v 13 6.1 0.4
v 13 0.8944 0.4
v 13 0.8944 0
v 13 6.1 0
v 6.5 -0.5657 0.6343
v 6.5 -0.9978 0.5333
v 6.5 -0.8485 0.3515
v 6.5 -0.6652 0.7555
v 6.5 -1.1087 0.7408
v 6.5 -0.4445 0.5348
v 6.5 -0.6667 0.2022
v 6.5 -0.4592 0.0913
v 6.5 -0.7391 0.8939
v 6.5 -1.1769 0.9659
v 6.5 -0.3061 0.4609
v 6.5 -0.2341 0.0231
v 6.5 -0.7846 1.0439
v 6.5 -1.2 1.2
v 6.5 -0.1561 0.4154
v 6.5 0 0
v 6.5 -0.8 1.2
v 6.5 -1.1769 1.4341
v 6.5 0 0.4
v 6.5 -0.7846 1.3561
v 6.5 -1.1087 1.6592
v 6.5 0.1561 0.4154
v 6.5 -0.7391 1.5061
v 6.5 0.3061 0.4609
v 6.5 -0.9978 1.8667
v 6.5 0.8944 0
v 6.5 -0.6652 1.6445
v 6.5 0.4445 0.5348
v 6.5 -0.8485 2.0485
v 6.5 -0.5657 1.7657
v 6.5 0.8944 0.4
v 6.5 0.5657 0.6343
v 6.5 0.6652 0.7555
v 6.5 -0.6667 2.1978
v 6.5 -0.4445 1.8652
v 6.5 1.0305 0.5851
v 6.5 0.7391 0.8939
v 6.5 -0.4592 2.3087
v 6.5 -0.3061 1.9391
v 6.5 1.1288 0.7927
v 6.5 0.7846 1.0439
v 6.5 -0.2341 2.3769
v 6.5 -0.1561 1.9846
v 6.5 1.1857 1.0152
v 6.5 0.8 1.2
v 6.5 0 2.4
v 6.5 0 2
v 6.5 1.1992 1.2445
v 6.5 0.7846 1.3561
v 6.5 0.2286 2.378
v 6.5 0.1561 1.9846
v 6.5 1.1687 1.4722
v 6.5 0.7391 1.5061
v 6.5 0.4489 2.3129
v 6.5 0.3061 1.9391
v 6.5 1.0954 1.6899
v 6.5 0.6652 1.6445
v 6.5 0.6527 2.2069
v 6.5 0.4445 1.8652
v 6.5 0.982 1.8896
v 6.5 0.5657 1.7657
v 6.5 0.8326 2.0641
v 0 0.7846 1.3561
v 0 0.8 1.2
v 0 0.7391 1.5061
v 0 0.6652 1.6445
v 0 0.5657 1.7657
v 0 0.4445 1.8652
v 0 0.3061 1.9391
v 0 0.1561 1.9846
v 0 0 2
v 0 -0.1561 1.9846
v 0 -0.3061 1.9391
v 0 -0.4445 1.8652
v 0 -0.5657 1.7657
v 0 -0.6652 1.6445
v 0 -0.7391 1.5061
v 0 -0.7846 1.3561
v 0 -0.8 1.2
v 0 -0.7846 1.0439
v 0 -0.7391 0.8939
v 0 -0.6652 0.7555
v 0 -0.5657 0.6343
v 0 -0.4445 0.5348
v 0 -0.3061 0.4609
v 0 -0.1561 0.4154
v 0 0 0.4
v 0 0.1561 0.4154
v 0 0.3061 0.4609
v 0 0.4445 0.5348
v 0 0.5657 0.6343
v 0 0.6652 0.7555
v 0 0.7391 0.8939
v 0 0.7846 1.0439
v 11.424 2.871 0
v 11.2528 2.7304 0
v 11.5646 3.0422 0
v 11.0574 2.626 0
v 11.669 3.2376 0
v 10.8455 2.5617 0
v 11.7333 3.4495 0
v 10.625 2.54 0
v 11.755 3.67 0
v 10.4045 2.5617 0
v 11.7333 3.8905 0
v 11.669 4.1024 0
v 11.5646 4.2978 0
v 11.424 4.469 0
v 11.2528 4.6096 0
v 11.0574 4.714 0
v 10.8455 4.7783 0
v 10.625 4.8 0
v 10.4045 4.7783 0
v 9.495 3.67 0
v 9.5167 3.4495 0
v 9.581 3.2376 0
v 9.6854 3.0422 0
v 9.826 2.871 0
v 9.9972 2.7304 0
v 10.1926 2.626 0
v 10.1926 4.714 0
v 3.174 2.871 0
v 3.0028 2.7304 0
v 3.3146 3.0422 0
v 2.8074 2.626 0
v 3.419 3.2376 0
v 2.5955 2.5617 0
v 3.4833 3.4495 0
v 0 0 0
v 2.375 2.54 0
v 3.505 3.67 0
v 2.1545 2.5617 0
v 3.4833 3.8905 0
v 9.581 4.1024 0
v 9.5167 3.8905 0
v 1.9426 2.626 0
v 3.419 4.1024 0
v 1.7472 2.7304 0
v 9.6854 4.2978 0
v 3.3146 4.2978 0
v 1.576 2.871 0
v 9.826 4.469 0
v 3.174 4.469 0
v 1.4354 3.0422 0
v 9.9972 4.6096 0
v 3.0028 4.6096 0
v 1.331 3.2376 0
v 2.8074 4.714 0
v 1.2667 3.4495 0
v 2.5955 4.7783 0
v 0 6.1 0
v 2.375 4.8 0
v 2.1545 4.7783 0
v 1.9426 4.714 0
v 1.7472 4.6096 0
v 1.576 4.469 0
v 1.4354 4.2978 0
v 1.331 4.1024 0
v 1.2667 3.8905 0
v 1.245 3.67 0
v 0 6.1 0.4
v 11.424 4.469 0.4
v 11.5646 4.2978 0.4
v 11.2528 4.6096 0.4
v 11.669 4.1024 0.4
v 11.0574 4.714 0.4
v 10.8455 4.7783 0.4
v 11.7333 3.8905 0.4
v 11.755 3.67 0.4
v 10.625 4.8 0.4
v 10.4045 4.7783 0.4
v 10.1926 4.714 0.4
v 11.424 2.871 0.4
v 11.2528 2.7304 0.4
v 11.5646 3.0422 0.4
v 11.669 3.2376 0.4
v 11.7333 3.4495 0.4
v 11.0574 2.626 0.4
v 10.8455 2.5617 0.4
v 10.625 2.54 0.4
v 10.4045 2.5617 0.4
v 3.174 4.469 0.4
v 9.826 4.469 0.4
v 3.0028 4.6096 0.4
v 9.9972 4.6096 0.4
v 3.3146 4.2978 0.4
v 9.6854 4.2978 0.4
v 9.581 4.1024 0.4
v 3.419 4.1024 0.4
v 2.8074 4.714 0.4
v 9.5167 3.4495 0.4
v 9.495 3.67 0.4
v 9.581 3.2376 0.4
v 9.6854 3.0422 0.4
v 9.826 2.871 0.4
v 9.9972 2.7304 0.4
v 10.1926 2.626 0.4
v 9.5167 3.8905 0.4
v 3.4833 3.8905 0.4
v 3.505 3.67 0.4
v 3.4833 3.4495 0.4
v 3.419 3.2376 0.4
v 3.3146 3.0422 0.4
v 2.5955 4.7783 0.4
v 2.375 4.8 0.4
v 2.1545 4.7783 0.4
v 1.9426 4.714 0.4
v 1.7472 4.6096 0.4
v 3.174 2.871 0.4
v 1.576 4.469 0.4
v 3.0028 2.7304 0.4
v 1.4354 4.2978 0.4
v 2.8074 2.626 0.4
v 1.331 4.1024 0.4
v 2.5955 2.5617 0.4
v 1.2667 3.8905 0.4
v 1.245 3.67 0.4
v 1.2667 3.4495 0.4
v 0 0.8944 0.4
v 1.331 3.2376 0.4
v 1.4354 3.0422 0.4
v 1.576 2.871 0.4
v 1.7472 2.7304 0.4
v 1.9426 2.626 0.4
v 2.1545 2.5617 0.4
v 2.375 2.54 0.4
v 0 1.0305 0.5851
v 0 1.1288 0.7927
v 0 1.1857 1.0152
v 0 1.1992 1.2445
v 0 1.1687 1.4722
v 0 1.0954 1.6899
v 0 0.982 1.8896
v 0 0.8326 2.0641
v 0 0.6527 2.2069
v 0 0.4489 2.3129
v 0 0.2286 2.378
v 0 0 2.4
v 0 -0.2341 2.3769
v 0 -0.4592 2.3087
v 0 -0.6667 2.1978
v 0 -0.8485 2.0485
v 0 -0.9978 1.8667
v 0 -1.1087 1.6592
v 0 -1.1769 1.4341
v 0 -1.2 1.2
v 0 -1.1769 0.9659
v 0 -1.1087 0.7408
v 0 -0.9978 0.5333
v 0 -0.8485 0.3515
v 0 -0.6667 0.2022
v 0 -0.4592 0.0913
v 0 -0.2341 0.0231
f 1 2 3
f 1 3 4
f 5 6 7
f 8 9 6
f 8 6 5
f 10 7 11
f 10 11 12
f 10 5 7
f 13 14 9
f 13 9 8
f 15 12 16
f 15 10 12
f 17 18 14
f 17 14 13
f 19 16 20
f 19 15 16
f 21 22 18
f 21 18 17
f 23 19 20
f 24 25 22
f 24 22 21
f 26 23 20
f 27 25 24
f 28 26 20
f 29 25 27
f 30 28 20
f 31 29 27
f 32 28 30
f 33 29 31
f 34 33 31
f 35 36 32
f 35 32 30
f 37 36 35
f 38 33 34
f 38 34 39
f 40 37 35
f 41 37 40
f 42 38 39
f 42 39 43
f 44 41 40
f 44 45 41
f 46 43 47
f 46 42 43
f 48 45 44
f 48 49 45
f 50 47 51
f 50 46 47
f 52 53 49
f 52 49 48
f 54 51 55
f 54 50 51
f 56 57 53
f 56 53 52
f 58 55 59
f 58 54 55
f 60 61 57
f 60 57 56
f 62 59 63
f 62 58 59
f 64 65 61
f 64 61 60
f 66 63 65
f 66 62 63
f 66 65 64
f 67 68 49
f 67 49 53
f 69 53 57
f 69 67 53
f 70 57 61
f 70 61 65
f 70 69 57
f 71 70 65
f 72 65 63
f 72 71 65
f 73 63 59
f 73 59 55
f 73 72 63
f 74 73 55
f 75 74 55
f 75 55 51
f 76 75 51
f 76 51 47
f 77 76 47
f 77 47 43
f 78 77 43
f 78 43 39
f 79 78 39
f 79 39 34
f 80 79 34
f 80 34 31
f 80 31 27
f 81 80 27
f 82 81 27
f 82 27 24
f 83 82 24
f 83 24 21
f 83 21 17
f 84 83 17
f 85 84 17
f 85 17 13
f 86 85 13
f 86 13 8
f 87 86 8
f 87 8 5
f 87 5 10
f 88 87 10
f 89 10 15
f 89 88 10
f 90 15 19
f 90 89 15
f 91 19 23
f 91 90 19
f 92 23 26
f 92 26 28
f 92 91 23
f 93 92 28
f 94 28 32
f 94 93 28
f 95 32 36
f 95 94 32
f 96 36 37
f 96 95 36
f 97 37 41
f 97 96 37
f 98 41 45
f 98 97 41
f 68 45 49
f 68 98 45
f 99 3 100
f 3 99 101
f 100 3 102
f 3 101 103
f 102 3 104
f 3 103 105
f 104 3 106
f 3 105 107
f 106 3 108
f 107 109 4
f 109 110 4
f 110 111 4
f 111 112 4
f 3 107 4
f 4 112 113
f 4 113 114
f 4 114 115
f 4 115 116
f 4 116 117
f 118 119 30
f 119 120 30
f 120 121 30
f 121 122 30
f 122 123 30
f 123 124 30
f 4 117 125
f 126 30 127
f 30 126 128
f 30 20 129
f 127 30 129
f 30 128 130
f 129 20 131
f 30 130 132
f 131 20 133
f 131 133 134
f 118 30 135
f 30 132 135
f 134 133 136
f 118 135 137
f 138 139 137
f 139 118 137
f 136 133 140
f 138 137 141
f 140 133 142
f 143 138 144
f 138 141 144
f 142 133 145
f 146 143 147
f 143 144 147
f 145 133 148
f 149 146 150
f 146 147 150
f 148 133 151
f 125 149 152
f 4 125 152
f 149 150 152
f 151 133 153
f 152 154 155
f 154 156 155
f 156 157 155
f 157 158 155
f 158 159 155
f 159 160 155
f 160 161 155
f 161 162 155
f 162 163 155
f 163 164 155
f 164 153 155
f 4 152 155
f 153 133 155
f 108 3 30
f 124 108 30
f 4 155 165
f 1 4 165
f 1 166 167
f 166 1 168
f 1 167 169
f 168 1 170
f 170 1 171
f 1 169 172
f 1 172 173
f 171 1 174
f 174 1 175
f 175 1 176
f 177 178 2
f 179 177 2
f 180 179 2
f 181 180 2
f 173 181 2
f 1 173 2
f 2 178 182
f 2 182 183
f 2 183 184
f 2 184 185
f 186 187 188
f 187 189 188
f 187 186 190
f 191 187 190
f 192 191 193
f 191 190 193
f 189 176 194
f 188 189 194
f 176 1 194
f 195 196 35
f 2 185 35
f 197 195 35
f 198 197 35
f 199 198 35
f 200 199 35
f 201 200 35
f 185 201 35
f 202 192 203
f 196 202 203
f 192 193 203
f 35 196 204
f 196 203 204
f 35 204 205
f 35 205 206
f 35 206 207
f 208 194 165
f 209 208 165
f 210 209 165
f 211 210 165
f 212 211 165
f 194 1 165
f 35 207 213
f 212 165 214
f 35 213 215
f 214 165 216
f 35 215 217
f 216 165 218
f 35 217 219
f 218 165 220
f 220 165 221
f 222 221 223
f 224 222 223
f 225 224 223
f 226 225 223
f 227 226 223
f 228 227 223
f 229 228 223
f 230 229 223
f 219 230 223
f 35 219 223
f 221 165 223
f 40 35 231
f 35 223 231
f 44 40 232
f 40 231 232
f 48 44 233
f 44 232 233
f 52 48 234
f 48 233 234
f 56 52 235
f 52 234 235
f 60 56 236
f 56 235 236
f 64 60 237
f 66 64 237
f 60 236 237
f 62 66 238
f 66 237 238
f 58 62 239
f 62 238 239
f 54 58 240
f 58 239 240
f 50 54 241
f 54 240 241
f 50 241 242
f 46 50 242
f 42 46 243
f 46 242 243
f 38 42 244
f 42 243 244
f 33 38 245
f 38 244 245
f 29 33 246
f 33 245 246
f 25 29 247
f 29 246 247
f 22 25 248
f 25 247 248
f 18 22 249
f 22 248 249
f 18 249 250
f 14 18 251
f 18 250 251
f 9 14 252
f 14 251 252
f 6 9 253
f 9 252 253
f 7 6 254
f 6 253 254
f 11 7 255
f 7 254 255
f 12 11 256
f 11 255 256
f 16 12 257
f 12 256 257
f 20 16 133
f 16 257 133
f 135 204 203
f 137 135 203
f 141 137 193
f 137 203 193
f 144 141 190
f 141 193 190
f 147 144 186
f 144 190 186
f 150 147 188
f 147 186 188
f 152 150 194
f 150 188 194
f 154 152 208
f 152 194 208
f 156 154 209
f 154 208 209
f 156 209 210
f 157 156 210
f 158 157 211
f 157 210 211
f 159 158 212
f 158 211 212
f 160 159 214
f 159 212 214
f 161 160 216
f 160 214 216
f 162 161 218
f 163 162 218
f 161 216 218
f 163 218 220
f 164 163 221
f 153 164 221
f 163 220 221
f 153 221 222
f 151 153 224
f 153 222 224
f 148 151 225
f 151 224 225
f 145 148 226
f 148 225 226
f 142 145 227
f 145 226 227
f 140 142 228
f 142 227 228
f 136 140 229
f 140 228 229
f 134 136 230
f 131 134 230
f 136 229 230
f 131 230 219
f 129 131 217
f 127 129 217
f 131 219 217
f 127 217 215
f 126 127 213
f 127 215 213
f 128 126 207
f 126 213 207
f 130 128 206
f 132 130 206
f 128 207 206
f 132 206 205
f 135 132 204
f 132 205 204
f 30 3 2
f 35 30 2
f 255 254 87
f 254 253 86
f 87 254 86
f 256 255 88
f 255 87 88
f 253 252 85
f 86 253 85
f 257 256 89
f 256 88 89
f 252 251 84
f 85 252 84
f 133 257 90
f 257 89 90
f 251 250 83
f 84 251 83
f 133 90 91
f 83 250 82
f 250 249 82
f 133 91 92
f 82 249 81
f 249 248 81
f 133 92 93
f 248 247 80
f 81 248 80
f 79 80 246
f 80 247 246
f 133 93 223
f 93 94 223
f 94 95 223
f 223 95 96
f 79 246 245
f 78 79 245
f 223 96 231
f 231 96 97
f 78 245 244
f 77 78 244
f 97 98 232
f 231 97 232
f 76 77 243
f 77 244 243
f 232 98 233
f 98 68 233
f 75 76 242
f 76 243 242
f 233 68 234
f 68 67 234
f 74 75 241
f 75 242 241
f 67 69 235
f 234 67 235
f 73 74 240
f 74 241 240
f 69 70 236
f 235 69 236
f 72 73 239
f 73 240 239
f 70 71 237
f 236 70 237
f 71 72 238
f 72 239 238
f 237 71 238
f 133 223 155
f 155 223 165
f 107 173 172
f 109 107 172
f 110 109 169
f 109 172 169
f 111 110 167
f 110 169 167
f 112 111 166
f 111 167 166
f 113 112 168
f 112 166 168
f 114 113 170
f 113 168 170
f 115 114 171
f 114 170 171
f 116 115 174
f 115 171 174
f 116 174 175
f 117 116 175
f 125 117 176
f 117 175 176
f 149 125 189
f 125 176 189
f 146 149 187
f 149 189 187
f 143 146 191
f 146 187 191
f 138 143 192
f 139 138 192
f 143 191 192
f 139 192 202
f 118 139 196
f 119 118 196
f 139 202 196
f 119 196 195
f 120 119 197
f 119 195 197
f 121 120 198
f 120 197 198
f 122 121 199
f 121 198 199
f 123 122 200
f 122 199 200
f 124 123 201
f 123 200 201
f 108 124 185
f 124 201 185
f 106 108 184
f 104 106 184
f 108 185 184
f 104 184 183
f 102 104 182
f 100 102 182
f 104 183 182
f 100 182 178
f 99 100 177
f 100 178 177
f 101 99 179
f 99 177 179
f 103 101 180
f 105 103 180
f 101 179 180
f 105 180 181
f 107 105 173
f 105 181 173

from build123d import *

# Parameters (mm, degrees)
F0_R     = 0.8
F1_DEPTH = 13
F2_R     = 0.8
F3_DEPTH = 6.5
F4_R     = 1.13
F5_DEPTH = 0.4


with BuildPart() as f1:
    # F0 (on Right) → F1 (new body)
    with BuildSketch(Plane.YZ):
        with BuildLine():
            ThreePointArc((0, 2.4), (-1.2, 1.2), (0, 0))
            Line((0, 0), (6.1, 0))
            Line((6.1, 0), (6.1, 0.4))
            Line((6.1, 0.4), (0.894427, 0.4))
            ThreePointArc((0.894427, 0.4), (1.095445, 1.689898), (0, 2.4))
        make_face()
        with Locations((0, 1.2)):
            Circle(F0_R, mode=Mode.SUBTRACT)
    extrude(amount=F1_DEPTH)

    # F2 (on face) → F3 (cut)
    with BuildSketch(Plane.YZ.offset(13)):
        with BuildLine():
            Line((0.894427, 0), (0.894427, 0.4))
            ThreePointArc((0.894427, 0.4), (-0.489898, 2.295445), (0, 0))
            Line((0, 0), (0.894427, 0))
        make_face()
        with Locations((0, 1.2)):
            Circle(F2_R, mode=Mode.SUBTRACT)
    extrude(amount=-F3_DEPTH, mode=Mode.SUBTRACT)

    # F4 (on face) → F5 (cut, through all)
    with BuildSketch(Plane.XY.offset(0.4)):
        with Locations((2.375, 3.67)):
            Circle(F4_R)
        with Locations((10.625, 3.67)):
            Circle(F4_R)
    extrude(amount=-F5_DEPTH, mode=Mode.SUBTRACT)


solid = f1.part
